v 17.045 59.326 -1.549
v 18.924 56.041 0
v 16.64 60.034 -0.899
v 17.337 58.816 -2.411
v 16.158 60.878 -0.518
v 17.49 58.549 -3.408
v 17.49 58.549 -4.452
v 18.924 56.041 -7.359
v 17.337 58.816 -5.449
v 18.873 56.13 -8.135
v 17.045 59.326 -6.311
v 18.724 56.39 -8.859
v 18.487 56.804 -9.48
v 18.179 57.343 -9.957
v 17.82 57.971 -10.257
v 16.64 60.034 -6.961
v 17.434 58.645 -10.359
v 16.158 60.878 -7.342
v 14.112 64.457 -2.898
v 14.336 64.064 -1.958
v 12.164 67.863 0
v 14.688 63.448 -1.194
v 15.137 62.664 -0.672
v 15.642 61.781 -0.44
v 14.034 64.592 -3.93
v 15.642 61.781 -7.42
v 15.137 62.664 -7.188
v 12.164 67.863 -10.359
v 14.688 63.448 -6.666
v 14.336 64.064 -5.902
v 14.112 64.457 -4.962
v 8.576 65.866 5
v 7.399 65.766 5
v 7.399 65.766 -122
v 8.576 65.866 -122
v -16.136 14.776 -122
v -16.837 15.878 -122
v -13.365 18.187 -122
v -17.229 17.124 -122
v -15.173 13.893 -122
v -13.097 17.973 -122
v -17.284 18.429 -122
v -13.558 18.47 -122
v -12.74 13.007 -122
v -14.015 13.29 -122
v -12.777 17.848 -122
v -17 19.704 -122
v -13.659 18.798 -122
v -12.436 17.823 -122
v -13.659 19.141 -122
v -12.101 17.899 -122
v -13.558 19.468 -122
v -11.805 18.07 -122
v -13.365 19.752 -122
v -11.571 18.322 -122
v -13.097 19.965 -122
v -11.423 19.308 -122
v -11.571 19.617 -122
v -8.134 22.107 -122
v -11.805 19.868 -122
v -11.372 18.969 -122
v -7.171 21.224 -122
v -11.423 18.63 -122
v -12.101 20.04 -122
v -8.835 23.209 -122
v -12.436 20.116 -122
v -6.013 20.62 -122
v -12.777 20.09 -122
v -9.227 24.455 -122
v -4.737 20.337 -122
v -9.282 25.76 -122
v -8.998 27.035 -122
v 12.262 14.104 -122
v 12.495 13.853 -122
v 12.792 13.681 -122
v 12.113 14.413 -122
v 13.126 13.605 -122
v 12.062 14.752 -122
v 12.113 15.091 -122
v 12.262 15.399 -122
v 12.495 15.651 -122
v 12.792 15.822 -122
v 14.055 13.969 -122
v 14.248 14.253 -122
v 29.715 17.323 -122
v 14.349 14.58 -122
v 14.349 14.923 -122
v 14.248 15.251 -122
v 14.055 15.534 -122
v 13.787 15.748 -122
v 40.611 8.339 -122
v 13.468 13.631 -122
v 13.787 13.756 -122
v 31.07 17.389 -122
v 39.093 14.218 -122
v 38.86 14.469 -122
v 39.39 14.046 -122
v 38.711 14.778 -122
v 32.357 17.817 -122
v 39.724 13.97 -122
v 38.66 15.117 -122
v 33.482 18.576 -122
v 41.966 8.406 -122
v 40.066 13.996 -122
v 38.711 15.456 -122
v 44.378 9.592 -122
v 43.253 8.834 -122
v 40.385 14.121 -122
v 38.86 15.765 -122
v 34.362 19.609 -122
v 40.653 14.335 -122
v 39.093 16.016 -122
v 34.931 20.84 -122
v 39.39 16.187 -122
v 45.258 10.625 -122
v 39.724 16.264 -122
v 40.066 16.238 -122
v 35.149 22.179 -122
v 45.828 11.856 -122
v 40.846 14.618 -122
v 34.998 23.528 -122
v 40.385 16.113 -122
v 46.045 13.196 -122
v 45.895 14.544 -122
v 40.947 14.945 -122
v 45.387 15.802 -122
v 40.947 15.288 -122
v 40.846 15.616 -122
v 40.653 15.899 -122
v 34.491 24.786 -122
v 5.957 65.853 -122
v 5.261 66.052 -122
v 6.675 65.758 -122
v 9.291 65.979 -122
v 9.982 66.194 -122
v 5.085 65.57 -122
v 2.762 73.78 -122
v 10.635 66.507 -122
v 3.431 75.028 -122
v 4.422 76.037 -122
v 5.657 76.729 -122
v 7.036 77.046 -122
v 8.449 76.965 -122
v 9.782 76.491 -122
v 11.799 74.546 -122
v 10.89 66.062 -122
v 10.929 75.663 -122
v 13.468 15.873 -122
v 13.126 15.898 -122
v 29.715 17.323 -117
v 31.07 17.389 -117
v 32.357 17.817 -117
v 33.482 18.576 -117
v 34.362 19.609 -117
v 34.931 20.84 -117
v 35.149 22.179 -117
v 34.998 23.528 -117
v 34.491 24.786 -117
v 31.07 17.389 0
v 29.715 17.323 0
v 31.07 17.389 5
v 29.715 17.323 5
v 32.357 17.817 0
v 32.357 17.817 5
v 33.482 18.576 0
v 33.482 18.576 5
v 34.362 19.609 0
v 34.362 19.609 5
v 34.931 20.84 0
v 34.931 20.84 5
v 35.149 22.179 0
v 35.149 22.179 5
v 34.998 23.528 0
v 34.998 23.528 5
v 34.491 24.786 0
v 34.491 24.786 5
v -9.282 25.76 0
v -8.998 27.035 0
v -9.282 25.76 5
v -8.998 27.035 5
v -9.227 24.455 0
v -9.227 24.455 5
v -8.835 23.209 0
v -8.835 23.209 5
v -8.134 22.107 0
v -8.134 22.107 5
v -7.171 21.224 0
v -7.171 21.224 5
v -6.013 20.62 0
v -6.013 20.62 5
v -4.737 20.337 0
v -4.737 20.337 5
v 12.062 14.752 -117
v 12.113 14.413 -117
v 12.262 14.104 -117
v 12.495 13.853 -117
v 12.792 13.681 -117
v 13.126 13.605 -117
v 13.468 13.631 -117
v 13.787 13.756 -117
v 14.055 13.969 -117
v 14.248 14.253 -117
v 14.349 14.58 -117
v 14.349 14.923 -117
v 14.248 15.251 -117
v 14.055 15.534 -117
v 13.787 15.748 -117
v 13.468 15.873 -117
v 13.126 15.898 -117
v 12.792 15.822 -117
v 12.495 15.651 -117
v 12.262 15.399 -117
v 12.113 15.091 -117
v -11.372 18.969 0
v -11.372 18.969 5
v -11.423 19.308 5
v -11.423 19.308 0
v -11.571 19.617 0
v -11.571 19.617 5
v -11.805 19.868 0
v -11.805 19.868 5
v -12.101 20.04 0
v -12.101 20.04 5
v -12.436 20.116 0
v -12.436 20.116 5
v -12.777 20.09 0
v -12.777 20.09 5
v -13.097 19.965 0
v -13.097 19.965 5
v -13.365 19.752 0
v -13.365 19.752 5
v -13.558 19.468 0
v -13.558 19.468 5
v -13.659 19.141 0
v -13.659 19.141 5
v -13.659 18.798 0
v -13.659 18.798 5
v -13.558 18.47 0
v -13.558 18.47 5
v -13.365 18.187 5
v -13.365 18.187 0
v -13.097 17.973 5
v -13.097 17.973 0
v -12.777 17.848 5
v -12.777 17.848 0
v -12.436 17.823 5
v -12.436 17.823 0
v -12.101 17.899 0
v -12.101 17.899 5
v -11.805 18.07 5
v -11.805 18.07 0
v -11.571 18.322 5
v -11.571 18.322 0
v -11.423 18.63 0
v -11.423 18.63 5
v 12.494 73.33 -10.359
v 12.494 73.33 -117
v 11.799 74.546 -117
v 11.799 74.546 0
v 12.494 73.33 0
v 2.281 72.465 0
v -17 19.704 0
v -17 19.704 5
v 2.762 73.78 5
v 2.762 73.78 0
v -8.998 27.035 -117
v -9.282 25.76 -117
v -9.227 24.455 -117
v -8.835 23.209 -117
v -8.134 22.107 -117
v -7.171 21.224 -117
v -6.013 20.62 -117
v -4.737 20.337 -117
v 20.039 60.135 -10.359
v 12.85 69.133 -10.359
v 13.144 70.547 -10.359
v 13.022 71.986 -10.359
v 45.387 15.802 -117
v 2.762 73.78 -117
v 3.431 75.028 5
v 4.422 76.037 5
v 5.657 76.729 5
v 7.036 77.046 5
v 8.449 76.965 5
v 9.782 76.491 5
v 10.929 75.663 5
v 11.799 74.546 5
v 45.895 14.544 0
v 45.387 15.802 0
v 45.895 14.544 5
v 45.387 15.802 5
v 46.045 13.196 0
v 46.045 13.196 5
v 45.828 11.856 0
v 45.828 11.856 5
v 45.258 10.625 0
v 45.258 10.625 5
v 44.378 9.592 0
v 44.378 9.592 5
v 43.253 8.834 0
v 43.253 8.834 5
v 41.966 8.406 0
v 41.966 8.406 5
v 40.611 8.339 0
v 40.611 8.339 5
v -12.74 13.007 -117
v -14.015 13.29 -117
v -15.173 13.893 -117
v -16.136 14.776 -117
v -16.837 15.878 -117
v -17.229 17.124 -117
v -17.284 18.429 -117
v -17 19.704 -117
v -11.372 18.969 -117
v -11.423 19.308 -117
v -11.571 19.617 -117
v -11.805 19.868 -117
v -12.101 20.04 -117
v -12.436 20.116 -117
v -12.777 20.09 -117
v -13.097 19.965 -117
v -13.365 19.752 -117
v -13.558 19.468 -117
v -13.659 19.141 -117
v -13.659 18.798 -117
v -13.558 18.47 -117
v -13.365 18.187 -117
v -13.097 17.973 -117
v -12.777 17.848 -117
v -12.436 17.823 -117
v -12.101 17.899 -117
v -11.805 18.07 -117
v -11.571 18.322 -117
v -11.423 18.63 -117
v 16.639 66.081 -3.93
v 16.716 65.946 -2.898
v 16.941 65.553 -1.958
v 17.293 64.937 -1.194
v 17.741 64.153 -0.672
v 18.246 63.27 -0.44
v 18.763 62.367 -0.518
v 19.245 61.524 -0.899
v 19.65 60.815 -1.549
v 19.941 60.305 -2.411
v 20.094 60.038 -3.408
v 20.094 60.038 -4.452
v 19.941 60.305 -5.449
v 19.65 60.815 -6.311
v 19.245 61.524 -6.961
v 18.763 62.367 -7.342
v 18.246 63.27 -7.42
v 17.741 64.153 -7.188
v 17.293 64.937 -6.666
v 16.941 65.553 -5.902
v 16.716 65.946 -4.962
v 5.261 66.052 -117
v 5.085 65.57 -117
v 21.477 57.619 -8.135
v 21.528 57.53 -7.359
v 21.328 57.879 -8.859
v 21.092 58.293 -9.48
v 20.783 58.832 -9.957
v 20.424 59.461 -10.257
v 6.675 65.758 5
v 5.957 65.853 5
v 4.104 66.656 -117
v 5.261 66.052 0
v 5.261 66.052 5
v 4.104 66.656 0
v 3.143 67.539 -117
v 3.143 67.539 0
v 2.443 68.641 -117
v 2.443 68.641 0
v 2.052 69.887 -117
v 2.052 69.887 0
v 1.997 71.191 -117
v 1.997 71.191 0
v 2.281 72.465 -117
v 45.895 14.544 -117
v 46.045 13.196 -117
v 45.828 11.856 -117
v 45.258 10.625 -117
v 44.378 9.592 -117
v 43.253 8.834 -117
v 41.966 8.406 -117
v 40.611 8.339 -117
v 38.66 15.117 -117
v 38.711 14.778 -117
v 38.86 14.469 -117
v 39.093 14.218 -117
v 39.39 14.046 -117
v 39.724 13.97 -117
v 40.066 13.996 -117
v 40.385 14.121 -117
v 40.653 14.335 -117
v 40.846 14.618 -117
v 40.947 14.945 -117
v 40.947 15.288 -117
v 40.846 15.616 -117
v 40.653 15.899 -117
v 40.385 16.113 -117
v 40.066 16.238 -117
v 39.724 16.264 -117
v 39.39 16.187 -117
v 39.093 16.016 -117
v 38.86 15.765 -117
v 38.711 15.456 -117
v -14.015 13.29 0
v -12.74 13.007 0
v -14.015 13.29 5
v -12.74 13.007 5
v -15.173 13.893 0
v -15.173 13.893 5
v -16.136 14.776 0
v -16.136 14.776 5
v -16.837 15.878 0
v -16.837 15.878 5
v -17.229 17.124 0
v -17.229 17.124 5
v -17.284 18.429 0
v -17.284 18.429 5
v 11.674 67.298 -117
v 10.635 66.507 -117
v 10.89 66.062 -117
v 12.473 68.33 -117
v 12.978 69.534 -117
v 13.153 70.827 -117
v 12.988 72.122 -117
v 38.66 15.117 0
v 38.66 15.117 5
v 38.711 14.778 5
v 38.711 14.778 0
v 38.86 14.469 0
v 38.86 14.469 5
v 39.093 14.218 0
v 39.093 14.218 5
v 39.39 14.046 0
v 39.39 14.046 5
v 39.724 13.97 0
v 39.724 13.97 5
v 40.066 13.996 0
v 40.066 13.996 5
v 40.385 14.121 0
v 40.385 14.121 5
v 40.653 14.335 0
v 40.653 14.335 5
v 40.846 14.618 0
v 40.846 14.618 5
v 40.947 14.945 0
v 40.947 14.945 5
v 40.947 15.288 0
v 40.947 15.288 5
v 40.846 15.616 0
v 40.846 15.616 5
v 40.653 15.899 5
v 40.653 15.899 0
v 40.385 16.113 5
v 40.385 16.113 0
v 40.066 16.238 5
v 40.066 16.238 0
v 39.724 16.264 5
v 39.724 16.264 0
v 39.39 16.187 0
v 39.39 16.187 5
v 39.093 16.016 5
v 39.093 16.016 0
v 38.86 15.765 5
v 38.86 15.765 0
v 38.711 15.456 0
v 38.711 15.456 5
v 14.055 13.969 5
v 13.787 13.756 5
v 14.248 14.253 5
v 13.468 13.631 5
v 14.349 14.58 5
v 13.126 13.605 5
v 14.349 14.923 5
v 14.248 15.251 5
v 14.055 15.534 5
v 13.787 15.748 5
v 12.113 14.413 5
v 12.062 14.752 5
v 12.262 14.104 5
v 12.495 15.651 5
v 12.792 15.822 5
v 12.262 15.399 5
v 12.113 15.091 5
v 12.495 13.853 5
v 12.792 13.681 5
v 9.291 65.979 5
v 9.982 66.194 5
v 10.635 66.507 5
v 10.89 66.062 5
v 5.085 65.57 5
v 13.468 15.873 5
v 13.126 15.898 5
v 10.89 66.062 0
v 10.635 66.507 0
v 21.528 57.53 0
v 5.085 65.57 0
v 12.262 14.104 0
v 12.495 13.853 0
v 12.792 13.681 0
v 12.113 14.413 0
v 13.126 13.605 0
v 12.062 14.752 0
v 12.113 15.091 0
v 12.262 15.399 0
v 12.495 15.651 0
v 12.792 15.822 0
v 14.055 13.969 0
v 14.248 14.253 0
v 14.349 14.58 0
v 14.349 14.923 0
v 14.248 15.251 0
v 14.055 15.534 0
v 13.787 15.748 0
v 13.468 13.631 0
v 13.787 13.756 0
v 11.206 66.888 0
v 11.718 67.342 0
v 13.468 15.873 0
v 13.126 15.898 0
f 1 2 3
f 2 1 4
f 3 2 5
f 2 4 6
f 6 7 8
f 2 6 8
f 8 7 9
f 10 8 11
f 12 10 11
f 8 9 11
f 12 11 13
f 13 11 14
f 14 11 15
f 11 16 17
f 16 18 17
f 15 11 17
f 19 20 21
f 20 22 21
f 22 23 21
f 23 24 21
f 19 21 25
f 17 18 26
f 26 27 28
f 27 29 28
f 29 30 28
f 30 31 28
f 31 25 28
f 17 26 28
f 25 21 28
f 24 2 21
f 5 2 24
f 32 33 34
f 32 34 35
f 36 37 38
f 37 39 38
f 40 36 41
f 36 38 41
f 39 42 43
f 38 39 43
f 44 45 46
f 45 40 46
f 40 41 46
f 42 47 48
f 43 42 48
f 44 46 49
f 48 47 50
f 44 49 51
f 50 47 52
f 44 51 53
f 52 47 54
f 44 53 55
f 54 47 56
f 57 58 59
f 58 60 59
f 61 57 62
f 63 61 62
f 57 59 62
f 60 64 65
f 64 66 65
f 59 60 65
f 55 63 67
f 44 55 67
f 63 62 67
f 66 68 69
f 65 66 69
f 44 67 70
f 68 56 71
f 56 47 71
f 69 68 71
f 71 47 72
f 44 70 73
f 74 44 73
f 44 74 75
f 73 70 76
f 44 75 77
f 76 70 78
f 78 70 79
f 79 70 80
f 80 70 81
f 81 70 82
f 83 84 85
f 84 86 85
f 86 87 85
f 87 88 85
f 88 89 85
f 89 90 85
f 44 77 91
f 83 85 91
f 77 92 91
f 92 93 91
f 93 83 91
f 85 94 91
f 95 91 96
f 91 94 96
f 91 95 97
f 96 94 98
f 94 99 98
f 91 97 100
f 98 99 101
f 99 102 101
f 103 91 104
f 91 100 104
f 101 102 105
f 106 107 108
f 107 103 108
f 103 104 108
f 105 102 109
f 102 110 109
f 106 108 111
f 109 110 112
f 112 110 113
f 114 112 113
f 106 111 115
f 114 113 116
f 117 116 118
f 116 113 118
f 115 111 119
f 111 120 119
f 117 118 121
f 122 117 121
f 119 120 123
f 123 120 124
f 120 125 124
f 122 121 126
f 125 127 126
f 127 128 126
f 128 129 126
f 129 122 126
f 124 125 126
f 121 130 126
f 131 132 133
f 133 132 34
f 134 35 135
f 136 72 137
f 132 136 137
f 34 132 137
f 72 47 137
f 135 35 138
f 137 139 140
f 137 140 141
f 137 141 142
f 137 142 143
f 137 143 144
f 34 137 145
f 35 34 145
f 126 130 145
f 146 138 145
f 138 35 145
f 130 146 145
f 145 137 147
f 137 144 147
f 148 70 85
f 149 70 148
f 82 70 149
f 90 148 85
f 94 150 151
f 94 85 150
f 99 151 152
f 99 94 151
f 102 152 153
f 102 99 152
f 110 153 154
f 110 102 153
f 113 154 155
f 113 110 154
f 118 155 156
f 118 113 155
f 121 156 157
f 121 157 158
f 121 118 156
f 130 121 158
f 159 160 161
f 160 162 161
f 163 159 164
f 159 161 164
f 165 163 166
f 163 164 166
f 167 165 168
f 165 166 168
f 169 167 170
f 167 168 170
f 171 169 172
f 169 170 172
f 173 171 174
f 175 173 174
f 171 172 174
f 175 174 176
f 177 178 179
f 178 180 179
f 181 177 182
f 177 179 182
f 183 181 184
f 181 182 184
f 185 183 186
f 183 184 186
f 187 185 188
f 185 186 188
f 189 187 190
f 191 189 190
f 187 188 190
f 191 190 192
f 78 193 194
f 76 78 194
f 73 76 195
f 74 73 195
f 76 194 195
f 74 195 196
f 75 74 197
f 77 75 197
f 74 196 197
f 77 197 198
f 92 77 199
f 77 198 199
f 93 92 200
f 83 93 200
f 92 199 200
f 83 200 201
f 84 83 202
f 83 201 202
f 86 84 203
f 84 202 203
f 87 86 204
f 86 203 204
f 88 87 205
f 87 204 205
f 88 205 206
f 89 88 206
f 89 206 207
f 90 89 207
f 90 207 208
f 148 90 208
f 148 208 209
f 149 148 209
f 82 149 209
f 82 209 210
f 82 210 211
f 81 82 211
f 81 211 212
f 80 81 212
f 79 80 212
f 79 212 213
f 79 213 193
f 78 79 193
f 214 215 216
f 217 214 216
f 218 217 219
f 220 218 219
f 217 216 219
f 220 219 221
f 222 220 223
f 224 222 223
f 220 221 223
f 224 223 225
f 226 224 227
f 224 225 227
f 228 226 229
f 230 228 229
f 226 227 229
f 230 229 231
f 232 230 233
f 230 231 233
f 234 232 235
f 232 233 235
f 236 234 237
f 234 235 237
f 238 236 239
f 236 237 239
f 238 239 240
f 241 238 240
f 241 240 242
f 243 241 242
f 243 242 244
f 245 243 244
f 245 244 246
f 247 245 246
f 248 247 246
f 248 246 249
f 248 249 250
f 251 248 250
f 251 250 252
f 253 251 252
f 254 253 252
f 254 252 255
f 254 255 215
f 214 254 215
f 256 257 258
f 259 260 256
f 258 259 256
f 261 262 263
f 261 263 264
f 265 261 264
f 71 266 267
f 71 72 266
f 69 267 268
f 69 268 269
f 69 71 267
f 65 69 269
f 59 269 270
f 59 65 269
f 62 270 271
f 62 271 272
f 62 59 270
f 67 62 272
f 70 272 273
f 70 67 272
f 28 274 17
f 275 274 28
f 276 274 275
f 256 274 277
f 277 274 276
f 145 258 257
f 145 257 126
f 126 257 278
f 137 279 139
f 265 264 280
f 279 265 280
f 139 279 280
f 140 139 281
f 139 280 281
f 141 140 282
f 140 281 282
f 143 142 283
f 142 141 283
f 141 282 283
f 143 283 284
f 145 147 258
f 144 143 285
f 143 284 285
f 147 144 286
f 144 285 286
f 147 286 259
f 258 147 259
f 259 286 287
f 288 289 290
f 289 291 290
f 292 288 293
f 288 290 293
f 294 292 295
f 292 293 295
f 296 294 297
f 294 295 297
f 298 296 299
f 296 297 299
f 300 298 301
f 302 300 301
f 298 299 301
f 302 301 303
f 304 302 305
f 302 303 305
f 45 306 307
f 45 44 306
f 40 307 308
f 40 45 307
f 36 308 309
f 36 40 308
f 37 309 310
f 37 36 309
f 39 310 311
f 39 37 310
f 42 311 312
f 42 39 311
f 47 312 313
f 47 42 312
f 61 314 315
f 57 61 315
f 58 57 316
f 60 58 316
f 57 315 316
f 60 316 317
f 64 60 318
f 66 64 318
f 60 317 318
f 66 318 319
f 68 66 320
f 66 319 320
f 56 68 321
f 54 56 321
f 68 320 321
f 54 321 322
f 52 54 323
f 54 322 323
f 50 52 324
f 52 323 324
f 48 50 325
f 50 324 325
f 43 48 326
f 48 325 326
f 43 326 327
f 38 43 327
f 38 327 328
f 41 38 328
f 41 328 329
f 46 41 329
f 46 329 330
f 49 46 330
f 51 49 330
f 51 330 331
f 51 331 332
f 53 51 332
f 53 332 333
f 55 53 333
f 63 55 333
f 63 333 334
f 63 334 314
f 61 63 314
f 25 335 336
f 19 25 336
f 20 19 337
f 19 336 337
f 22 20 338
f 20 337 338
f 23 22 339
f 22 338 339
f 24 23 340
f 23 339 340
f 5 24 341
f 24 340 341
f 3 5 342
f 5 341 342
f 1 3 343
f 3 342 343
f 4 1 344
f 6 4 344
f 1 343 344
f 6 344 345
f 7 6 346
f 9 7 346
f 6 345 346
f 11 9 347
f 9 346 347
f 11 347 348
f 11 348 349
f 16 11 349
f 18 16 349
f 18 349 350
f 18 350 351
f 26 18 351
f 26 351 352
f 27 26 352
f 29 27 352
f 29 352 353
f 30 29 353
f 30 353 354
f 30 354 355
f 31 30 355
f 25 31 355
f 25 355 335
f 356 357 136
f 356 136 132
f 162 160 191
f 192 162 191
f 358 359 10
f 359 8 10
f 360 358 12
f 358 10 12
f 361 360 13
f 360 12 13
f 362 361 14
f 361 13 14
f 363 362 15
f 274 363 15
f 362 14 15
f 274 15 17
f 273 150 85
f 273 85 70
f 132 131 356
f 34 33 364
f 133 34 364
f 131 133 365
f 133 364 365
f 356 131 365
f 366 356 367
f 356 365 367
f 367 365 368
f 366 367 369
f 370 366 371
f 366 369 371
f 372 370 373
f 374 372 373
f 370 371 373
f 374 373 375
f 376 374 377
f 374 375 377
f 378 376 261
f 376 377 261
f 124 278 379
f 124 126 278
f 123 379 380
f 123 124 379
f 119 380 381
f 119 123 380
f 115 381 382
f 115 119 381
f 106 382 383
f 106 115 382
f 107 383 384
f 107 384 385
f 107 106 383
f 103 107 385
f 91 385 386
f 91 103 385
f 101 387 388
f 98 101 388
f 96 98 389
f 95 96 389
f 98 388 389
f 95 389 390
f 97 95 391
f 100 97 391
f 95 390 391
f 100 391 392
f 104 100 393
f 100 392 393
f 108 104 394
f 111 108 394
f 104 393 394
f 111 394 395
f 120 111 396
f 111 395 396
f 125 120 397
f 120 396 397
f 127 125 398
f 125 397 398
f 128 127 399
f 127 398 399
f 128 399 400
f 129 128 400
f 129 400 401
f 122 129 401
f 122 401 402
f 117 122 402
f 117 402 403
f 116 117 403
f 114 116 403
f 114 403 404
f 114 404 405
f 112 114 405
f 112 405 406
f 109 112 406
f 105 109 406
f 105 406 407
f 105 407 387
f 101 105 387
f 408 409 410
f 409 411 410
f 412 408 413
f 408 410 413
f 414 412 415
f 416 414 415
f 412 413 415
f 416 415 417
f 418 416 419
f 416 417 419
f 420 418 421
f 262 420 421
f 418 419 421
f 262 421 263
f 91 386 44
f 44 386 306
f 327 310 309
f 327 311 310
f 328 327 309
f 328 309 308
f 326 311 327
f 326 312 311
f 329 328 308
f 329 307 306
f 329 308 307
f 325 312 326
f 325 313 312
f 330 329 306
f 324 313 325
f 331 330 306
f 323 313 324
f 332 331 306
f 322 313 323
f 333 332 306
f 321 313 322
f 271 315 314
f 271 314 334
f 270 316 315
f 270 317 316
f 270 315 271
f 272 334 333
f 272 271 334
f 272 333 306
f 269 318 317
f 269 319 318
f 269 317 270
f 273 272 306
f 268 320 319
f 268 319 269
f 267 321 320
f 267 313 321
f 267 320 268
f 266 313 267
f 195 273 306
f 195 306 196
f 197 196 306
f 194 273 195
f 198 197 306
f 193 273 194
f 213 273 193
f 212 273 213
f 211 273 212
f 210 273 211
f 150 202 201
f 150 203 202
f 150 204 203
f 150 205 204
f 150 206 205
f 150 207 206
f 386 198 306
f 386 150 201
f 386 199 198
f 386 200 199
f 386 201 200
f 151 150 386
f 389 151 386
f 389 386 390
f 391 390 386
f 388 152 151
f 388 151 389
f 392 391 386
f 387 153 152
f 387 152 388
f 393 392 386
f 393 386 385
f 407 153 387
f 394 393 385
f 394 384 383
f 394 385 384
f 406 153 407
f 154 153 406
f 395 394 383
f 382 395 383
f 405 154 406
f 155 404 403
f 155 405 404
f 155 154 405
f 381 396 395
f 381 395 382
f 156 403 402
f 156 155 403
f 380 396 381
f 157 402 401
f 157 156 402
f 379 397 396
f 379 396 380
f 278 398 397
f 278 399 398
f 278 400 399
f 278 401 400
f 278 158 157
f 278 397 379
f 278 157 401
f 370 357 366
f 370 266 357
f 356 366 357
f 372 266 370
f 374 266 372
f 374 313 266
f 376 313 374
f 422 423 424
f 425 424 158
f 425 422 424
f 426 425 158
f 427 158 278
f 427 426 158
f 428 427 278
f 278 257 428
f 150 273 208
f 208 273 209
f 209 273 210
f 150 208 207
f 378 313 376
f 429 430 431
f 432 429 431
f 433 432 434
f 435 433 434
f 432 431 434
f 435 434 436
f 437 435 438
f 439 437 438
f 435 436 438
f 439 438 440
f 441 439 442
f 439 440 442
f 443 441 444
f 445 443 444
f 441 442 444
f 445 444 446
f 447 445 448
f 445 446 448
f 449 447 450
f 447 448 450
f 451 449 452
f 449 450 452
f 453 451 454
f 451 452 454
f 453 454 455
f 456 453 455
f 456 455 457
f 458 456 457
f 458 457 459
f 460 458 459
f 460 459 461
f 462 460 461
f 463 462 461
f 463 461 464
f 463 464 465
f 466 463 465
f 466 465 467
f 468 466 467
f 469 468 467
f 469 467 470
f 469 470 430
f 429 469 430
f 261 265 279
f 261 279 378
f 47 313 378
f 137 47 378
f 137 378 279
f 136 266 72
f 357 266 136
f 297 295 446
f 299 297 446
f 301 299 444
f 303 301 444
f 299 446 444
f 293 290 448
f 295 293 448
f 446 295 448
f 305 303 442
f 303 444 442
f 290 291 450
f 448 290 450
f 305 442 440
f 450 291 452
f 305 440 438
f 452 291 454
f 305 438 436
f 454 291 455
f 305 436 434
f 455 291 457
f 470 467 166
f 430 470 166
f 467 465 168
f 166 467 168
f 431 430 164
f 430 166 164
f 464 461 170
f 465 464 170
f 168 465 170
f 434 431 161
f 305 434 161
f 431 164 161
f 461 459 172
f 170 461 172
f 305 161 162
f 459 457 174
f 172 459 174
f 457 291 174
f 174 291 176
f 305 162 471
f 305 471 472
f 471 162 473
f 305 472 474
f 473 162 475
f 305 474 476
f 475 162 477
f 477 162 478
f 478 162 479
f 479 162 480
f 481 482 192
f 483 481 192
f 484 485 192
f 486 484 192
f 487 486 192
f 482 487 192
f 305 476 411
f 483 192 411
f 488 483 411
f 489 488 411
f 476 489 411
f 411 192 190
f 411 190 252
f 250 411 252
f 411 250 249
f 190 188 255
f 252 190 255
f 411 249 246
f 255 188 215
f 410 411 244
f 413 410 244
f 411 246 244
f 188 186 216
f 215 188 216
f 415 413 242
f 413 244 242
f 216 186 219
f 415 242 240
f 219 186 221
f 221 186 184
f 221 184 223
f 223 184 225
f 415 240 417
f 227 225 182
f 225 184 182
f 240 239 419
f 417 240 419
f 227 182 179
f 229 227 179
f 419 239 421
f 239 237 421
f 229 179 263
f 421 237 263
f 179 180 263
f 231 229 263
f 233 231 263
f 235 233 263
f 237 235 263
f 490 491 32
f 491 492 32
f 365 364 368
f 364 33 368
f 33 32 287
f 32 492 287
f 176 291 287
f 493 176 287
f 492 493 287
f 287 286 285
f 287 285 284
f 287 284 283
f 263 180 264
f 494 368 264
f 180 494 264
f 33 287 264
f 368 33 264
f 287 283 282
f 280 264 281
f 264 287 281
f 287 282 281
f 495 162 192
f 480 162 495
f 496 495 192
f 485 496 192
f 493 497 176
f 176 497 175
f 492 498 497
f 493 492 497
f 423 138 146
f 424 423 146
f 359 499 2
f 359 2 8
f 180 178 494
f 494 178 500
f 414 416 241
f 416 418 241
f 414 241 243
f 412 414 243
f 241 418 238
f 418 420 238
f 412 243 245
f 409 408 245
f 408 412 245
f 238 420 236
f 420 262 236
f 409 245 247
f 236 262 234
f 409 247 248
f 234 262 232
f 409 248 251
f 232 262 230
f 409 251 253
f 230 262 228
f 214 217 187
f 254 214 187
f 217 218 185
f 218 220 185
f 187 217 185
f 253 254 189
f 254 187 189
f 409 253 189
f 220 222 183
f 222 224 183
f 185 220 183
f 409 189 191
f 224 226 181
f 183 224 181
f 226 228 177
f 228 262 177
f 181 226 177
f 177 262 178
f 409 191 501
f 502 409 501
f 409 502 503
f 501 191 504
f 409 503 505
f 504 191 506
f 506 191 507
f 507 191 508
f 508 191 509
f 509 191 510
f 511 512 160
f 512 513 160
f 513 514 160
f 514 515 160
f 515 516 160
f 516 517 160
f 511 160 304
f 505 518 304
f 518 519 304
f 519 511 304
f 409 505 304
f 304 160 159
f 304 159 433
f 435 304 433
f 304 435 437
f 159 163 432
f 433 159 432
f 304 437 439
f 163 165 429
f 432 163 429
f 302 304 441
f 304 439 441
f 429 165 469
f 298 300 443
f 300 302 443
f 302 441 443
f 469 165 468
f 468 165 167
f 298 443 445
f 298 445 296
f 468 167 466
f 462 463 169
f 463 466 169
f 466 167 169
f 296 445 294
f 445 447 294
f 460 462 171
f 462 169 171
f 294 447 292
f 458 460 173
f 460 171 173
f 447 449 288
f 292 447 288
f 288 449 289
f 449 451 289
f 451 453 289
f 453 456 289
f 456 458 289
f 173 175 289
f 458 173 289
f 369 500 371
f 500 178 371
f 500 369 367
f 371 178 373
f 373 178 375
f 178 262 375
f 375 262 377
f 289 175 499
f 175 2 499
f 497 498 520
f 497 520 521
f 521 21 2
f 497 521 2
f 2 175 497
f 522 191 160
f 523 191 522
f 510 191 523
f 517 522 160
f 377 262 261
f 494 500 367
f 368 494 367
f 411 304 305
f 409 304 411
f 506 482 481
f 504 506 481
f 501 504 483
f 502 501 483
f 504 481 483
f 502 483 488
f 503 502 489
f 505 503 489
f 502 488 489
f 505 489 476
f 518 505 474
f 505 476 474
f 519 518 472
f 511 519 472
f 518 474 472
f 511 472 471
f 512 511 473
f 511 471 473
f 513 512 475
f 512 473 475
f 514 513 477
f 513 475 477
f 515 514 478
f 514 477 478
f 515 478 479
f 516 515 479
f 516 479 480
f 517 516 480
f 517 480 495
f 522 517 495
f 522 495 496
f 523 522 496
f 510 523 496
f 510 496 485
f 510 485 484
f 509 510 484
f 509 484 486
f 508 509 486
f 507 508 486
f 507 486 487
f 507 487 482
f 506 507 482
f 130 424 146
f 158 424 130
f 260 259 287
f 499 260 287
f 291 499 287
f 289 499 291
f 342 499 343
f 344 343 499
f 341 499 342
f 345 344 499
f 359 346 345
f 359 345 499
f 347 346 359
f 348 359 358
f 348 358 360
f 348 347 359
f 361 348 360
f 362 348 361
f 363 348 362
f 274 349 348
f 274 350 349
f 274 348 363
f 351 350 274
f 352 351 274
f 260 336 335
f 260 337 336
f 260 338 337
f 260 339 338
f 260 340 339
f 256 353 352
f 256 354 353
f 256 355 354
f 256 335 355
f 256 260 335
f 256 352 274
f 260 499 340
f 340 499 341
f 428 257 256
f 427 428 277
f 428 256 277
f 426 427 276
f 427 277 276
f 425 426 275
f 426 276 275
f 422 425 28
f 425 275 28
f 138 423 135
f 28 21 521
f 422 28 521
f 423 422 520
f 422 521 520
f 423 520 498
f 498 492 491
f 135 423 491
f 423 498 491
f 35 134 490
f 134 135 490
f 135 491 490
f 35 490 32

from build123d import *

# Parameters (mm, degrees)
AUFSATZ_LINEAR_AUSTRAGEN1_DEPTH = 5
AUFSATZ_LINEAR_AUSTRAGEN2_DEPTH = 5
AUFSATZ_LINEAR_AUSTRAGEN3_DEPTH = 127
VERRUNDUNG1_R                   = 5
SKIZZE4_R                       = 1.15
SCHNITT_LINEAR_AUSTRAGEN1_DEPTH = 160.018146459
VERRUNDUNG2_R                   = 5
SKIZZE5_W                       = 10.358999457
SKIZZE5_H                       = 18.2
AUFSATZ_LINEAR_AUSTRAGEN4_DEPTH = 3
SKIZZE6_R                       = 3.5
SCHNITT_LINEAR_AUSTRAGEN2_DEPTH = 146.462570096
VERRUNDUNG4_R                   = 3


with BuildPart() as part:
    # Skizze1 → Aufsatz-Linear austragen1 (new body)
    with BuildSketch(Plane.XY):
        Polygon((-19.239846421, 13.575566883), (6.456161255, 83.889632397), (50.130587288, 7.506440349), align=None)
        Polygon((-11.237544669, 20.906014898), (7.458044946, 72.064269891), (39.234154141, 16.490313423), align=None, mode=Mode.SUBTRACT)
    extrude(amount=AUFSATZ_LINEAR_AUSTRAGEN1_DEPTH)



with BuildPart() as body_2:
    # Skizze2 → Aufsatz-Linear austragen2 (new body)
    with BuildSketch(Plane(origin=(0, 0, -117), x_dir=(-1, 0, 0), z_dir=(0, 0, -1))):
        Polygon((-50.130587288, 7.506440349), (19.239846421, 13.575566883), (-6.456161255, 83.889632397), align=None)
        Polygon((-39.234154141, 16.490313423), (11.237544669, 20.906014898), (-7.458044946, 72.064269891), align=None, mode=Mode.SUBTRACT)
    extrude(amount=AUFSATZ_LINEAR_AUSTRAGEN2_DEPTH)


with BuildPart() as part_1:
    add(part.part)

    add(body_2.part)  # Aufsatz-Linear austragen3 merges body 2
    # Skizze3 → Aufsatz-Linear austragen3 (add, through all)
    with BuildSketch(Plane.XY.offset(5)):
        Polygon((6.456161255, 83.889632397), (-0.408718311, 65.10470683), (16.38354695, 66.527402895), align=None)
    extrude(amount=-AUFSATZ_LINEAR_AUSTRAGEN3_DEPTH)

    # Verrundung1
    verrundung1_edges = [part_1.edges().sort_by_distance(p)[0] for p in [
        (-11.237544669, 20.906014898, 2.5),
        (39.234154141, 16.490313423, 2.5),
        (50.130587288, 7.506440349, -119.5),
        (-19.239846421, 13.575566883, -119.5),
        (39.234154141, 16.490313423, -119.5),
        (-11.237544669, 20.906014898, -119.5),
        (-19.239846421, 13.575566883, 2.5),
        (50.130587288, 7.506440349, 2.5),
    ]]
    fillet(verrundung1_edges, radius=VERRUNDUNG1_R)

    # Skizze4 → Schnitt-Linear austragen1 (cut, through all)
    with BuildSketch(Plane.XY.offset(5)):
        with Locations((-12.521530051, 18.969329152)):
            Circle(SKIZZE4_R)
        with Locations(Location((39.809827396, 15.116890366, 0), (0, 0, 180))):
            Circle(SKIZZE4_R)
        with Locations(Location((13.212061367, 14.751672192, 0), (0, 0, 180))):
            Circle(SKIZZE4_R)
    extrude(amount=-SCHNITT_LINEAR_AUSTRAGEN1_DEPTH, mode=Mode.SUBTRACT)

    # Verrundung2
    # the kernel refuses this fillet: 5 mm, written as the material it takes off along each edge
    with BuildSketch(Plane(origin=(6.456161255, 83.889632397, 31.907592949), x_dir=(-0.34324397830304476, -0.9392462783310345, 0), z_dir=(0, 0, -1))) as verrundung2_piece_1:
        with BuildLine():
            CenterArc((VERRUNDUNG2_R * 2.15260743589, -VERRUNDUNG2_R), VERRUNDUNG2_R, 90, 130.165278403)
            Line((VERRUNDUNG2_R * 1.38842039617, -VERRUNDUNG2_R * 1.64499470411), (0, 0))
            Line((0, 0), (VERRUNDUNG2_R * 2.15260743589, 0))
        make_face()
    extrude(amount=180.815185897, mode=Mode.SUBTRACT)
    with BuildSketch(Plane(origin=(-0.408718311, 65.10470683, 19.589879441), x_dir=(0.34324397830304404, 0.9392462783310347, 0), z_dir=(0, 0, -1))) as verrundung2_piece_2_section:
        with BuildLine():
            CenterArc((VERRUNDUNG2_R * 1.56719035525, VERRUNDUNG2_R), VERRUNDUNG2_R, 155.082639201, 114.917360799)
            Line((VERRUNDUNG2_R * 0.660273957752, VERRUNDUNG2_R * 1.42131063118), (0, 0))
            Line((0, 0), (VERRUNDUNG2_R * 1.56719035525, 0))
        make_face()
    verrundung2_piece_2 = extrude(amount=156.179758881, mode=Mode.PRIVATE)
    verrundung2_piece_2 = split(verrundung2_piece_2, bisect_by=Plane(origin=(5.223636013, 65.950075885, 2.5), z_dir=(0.9392462783310345, -0.34324397830304465, 0)), keep=Keep.TOP, mode=Mode.PRIVATE)
    add(verrundung2_piece_2, mode=Mode.SUBTRACT)
    with BuildSketch(Plane(origin=(-0.408718311, 65.10470683, 0), x_dir=(0.34324397830304504, 0.9392462783310342, 0), z_dir=(0, 0, -1)), Plane(origin=(16.38354695, 66.527402895, 0), x_dir=(-0.9964301882569208, -0.08442085009212626, 0), z_dir=(0, 0, -1))) as verrundung2_piece_3:
        with BuildLine():
            CenterArc((VERRUNDUNG2_R * 1.56719035525, VERRUNDUNG2_R), VERRUNDUNG2_R, 155.082639201, 114.917360799)
            Line((VERRUNDUNG2_R * 0.660273957752, VERRUNDUNG2_R * 1.42131063118), (0, 0))
            Line((0, 0), (VERRUNDUNG2_R * 1.56719035525, 0))
        make_face()
    extrude(amount=117, mode=Mode.SUBTRACT)
    with BuildSketch(Plane(origin=(16.38354695, 66.527402895, 19.589879441), x_dir=(-0.9964301882569208, -0.08442085009212626, 0), z_dir=(0, 0, -1))) as verrundung2_piece_4_section:
        with BuildLine():
            CenterArc((VERRUNDUNG2_R * 1.56719035525, VERRUNDUNG2_R), VERRUNDUNG2_R, 155.082639201, 114.917360799)
            Line((VERRUNDUNG2_R * 0.660273957752, VERRUNDUNG2_R * 1.42131063118), (0, 0))
            Line((0, 0), (VERRUNDUNG2_R * 1.56719035525, 0))
        make_face()
    verrundung2_piece_4 = extrude(amount=156.179758881, mode=Mode.PRIVATE)
    verrundung2_piece_4 = split(verrundung2_piece_4, bisect_by=Plane(origin=(10.689250835, 66.413140789, 2.5), z_dir=(-0.868111475056711, -0.4963692847818663, 0)), keep=Keep.TOP, mode=Mode.PRIVATE)
    add(verrundung2_piece_4, mode=Mode.SUBTRACT)

    # Skizze5 → Aufsatz-Linear austragen4 (add)
    with BuildSketch(Plane(origin=(41.013843737, 23.450919458, 0), x_dir=(0, 0, -1), z_dir=(0.868111475056711, 0.4963692847818664, 0))):
        with Locations((5.179499729, 48.356864154)):
            Rectangle(SKIZZE5_W, SKIZZE5_H)
    extrude(amount=-AUFSATZ_LINEAR_AUSTRAGEN4_DEPTH)

    # Skizze6 → Schnitt-Linear austragen2 (cut, through all)
    with BuildSketch(Plane(origin=(41.013843737, 23.450919458, 0), x_dir=(0, 0, -1), z_dir=(0.868111475056711, 0.4963692847818664, 0))):
        with Locations(Location((3.929999457, 45.606864154, 0), (0, 0, 90))):
            Circle(SKIZZE6_R)
    extrude(amount=-SCHNITT_LINEAR_AUSTRAGEN2_DEPTH, mode=Mode.SUBTRACT)

    # Verrundung4
    verrundung4_edges = [part_1.edges().sort_by_distance(p)[0] for p in [
        (20.225774942, 56.785699777, -10.358999457),
    ]]
    fillet(verrundung4_edges, radius=VERRUNDUNG4_R)


solid = part_1.part
